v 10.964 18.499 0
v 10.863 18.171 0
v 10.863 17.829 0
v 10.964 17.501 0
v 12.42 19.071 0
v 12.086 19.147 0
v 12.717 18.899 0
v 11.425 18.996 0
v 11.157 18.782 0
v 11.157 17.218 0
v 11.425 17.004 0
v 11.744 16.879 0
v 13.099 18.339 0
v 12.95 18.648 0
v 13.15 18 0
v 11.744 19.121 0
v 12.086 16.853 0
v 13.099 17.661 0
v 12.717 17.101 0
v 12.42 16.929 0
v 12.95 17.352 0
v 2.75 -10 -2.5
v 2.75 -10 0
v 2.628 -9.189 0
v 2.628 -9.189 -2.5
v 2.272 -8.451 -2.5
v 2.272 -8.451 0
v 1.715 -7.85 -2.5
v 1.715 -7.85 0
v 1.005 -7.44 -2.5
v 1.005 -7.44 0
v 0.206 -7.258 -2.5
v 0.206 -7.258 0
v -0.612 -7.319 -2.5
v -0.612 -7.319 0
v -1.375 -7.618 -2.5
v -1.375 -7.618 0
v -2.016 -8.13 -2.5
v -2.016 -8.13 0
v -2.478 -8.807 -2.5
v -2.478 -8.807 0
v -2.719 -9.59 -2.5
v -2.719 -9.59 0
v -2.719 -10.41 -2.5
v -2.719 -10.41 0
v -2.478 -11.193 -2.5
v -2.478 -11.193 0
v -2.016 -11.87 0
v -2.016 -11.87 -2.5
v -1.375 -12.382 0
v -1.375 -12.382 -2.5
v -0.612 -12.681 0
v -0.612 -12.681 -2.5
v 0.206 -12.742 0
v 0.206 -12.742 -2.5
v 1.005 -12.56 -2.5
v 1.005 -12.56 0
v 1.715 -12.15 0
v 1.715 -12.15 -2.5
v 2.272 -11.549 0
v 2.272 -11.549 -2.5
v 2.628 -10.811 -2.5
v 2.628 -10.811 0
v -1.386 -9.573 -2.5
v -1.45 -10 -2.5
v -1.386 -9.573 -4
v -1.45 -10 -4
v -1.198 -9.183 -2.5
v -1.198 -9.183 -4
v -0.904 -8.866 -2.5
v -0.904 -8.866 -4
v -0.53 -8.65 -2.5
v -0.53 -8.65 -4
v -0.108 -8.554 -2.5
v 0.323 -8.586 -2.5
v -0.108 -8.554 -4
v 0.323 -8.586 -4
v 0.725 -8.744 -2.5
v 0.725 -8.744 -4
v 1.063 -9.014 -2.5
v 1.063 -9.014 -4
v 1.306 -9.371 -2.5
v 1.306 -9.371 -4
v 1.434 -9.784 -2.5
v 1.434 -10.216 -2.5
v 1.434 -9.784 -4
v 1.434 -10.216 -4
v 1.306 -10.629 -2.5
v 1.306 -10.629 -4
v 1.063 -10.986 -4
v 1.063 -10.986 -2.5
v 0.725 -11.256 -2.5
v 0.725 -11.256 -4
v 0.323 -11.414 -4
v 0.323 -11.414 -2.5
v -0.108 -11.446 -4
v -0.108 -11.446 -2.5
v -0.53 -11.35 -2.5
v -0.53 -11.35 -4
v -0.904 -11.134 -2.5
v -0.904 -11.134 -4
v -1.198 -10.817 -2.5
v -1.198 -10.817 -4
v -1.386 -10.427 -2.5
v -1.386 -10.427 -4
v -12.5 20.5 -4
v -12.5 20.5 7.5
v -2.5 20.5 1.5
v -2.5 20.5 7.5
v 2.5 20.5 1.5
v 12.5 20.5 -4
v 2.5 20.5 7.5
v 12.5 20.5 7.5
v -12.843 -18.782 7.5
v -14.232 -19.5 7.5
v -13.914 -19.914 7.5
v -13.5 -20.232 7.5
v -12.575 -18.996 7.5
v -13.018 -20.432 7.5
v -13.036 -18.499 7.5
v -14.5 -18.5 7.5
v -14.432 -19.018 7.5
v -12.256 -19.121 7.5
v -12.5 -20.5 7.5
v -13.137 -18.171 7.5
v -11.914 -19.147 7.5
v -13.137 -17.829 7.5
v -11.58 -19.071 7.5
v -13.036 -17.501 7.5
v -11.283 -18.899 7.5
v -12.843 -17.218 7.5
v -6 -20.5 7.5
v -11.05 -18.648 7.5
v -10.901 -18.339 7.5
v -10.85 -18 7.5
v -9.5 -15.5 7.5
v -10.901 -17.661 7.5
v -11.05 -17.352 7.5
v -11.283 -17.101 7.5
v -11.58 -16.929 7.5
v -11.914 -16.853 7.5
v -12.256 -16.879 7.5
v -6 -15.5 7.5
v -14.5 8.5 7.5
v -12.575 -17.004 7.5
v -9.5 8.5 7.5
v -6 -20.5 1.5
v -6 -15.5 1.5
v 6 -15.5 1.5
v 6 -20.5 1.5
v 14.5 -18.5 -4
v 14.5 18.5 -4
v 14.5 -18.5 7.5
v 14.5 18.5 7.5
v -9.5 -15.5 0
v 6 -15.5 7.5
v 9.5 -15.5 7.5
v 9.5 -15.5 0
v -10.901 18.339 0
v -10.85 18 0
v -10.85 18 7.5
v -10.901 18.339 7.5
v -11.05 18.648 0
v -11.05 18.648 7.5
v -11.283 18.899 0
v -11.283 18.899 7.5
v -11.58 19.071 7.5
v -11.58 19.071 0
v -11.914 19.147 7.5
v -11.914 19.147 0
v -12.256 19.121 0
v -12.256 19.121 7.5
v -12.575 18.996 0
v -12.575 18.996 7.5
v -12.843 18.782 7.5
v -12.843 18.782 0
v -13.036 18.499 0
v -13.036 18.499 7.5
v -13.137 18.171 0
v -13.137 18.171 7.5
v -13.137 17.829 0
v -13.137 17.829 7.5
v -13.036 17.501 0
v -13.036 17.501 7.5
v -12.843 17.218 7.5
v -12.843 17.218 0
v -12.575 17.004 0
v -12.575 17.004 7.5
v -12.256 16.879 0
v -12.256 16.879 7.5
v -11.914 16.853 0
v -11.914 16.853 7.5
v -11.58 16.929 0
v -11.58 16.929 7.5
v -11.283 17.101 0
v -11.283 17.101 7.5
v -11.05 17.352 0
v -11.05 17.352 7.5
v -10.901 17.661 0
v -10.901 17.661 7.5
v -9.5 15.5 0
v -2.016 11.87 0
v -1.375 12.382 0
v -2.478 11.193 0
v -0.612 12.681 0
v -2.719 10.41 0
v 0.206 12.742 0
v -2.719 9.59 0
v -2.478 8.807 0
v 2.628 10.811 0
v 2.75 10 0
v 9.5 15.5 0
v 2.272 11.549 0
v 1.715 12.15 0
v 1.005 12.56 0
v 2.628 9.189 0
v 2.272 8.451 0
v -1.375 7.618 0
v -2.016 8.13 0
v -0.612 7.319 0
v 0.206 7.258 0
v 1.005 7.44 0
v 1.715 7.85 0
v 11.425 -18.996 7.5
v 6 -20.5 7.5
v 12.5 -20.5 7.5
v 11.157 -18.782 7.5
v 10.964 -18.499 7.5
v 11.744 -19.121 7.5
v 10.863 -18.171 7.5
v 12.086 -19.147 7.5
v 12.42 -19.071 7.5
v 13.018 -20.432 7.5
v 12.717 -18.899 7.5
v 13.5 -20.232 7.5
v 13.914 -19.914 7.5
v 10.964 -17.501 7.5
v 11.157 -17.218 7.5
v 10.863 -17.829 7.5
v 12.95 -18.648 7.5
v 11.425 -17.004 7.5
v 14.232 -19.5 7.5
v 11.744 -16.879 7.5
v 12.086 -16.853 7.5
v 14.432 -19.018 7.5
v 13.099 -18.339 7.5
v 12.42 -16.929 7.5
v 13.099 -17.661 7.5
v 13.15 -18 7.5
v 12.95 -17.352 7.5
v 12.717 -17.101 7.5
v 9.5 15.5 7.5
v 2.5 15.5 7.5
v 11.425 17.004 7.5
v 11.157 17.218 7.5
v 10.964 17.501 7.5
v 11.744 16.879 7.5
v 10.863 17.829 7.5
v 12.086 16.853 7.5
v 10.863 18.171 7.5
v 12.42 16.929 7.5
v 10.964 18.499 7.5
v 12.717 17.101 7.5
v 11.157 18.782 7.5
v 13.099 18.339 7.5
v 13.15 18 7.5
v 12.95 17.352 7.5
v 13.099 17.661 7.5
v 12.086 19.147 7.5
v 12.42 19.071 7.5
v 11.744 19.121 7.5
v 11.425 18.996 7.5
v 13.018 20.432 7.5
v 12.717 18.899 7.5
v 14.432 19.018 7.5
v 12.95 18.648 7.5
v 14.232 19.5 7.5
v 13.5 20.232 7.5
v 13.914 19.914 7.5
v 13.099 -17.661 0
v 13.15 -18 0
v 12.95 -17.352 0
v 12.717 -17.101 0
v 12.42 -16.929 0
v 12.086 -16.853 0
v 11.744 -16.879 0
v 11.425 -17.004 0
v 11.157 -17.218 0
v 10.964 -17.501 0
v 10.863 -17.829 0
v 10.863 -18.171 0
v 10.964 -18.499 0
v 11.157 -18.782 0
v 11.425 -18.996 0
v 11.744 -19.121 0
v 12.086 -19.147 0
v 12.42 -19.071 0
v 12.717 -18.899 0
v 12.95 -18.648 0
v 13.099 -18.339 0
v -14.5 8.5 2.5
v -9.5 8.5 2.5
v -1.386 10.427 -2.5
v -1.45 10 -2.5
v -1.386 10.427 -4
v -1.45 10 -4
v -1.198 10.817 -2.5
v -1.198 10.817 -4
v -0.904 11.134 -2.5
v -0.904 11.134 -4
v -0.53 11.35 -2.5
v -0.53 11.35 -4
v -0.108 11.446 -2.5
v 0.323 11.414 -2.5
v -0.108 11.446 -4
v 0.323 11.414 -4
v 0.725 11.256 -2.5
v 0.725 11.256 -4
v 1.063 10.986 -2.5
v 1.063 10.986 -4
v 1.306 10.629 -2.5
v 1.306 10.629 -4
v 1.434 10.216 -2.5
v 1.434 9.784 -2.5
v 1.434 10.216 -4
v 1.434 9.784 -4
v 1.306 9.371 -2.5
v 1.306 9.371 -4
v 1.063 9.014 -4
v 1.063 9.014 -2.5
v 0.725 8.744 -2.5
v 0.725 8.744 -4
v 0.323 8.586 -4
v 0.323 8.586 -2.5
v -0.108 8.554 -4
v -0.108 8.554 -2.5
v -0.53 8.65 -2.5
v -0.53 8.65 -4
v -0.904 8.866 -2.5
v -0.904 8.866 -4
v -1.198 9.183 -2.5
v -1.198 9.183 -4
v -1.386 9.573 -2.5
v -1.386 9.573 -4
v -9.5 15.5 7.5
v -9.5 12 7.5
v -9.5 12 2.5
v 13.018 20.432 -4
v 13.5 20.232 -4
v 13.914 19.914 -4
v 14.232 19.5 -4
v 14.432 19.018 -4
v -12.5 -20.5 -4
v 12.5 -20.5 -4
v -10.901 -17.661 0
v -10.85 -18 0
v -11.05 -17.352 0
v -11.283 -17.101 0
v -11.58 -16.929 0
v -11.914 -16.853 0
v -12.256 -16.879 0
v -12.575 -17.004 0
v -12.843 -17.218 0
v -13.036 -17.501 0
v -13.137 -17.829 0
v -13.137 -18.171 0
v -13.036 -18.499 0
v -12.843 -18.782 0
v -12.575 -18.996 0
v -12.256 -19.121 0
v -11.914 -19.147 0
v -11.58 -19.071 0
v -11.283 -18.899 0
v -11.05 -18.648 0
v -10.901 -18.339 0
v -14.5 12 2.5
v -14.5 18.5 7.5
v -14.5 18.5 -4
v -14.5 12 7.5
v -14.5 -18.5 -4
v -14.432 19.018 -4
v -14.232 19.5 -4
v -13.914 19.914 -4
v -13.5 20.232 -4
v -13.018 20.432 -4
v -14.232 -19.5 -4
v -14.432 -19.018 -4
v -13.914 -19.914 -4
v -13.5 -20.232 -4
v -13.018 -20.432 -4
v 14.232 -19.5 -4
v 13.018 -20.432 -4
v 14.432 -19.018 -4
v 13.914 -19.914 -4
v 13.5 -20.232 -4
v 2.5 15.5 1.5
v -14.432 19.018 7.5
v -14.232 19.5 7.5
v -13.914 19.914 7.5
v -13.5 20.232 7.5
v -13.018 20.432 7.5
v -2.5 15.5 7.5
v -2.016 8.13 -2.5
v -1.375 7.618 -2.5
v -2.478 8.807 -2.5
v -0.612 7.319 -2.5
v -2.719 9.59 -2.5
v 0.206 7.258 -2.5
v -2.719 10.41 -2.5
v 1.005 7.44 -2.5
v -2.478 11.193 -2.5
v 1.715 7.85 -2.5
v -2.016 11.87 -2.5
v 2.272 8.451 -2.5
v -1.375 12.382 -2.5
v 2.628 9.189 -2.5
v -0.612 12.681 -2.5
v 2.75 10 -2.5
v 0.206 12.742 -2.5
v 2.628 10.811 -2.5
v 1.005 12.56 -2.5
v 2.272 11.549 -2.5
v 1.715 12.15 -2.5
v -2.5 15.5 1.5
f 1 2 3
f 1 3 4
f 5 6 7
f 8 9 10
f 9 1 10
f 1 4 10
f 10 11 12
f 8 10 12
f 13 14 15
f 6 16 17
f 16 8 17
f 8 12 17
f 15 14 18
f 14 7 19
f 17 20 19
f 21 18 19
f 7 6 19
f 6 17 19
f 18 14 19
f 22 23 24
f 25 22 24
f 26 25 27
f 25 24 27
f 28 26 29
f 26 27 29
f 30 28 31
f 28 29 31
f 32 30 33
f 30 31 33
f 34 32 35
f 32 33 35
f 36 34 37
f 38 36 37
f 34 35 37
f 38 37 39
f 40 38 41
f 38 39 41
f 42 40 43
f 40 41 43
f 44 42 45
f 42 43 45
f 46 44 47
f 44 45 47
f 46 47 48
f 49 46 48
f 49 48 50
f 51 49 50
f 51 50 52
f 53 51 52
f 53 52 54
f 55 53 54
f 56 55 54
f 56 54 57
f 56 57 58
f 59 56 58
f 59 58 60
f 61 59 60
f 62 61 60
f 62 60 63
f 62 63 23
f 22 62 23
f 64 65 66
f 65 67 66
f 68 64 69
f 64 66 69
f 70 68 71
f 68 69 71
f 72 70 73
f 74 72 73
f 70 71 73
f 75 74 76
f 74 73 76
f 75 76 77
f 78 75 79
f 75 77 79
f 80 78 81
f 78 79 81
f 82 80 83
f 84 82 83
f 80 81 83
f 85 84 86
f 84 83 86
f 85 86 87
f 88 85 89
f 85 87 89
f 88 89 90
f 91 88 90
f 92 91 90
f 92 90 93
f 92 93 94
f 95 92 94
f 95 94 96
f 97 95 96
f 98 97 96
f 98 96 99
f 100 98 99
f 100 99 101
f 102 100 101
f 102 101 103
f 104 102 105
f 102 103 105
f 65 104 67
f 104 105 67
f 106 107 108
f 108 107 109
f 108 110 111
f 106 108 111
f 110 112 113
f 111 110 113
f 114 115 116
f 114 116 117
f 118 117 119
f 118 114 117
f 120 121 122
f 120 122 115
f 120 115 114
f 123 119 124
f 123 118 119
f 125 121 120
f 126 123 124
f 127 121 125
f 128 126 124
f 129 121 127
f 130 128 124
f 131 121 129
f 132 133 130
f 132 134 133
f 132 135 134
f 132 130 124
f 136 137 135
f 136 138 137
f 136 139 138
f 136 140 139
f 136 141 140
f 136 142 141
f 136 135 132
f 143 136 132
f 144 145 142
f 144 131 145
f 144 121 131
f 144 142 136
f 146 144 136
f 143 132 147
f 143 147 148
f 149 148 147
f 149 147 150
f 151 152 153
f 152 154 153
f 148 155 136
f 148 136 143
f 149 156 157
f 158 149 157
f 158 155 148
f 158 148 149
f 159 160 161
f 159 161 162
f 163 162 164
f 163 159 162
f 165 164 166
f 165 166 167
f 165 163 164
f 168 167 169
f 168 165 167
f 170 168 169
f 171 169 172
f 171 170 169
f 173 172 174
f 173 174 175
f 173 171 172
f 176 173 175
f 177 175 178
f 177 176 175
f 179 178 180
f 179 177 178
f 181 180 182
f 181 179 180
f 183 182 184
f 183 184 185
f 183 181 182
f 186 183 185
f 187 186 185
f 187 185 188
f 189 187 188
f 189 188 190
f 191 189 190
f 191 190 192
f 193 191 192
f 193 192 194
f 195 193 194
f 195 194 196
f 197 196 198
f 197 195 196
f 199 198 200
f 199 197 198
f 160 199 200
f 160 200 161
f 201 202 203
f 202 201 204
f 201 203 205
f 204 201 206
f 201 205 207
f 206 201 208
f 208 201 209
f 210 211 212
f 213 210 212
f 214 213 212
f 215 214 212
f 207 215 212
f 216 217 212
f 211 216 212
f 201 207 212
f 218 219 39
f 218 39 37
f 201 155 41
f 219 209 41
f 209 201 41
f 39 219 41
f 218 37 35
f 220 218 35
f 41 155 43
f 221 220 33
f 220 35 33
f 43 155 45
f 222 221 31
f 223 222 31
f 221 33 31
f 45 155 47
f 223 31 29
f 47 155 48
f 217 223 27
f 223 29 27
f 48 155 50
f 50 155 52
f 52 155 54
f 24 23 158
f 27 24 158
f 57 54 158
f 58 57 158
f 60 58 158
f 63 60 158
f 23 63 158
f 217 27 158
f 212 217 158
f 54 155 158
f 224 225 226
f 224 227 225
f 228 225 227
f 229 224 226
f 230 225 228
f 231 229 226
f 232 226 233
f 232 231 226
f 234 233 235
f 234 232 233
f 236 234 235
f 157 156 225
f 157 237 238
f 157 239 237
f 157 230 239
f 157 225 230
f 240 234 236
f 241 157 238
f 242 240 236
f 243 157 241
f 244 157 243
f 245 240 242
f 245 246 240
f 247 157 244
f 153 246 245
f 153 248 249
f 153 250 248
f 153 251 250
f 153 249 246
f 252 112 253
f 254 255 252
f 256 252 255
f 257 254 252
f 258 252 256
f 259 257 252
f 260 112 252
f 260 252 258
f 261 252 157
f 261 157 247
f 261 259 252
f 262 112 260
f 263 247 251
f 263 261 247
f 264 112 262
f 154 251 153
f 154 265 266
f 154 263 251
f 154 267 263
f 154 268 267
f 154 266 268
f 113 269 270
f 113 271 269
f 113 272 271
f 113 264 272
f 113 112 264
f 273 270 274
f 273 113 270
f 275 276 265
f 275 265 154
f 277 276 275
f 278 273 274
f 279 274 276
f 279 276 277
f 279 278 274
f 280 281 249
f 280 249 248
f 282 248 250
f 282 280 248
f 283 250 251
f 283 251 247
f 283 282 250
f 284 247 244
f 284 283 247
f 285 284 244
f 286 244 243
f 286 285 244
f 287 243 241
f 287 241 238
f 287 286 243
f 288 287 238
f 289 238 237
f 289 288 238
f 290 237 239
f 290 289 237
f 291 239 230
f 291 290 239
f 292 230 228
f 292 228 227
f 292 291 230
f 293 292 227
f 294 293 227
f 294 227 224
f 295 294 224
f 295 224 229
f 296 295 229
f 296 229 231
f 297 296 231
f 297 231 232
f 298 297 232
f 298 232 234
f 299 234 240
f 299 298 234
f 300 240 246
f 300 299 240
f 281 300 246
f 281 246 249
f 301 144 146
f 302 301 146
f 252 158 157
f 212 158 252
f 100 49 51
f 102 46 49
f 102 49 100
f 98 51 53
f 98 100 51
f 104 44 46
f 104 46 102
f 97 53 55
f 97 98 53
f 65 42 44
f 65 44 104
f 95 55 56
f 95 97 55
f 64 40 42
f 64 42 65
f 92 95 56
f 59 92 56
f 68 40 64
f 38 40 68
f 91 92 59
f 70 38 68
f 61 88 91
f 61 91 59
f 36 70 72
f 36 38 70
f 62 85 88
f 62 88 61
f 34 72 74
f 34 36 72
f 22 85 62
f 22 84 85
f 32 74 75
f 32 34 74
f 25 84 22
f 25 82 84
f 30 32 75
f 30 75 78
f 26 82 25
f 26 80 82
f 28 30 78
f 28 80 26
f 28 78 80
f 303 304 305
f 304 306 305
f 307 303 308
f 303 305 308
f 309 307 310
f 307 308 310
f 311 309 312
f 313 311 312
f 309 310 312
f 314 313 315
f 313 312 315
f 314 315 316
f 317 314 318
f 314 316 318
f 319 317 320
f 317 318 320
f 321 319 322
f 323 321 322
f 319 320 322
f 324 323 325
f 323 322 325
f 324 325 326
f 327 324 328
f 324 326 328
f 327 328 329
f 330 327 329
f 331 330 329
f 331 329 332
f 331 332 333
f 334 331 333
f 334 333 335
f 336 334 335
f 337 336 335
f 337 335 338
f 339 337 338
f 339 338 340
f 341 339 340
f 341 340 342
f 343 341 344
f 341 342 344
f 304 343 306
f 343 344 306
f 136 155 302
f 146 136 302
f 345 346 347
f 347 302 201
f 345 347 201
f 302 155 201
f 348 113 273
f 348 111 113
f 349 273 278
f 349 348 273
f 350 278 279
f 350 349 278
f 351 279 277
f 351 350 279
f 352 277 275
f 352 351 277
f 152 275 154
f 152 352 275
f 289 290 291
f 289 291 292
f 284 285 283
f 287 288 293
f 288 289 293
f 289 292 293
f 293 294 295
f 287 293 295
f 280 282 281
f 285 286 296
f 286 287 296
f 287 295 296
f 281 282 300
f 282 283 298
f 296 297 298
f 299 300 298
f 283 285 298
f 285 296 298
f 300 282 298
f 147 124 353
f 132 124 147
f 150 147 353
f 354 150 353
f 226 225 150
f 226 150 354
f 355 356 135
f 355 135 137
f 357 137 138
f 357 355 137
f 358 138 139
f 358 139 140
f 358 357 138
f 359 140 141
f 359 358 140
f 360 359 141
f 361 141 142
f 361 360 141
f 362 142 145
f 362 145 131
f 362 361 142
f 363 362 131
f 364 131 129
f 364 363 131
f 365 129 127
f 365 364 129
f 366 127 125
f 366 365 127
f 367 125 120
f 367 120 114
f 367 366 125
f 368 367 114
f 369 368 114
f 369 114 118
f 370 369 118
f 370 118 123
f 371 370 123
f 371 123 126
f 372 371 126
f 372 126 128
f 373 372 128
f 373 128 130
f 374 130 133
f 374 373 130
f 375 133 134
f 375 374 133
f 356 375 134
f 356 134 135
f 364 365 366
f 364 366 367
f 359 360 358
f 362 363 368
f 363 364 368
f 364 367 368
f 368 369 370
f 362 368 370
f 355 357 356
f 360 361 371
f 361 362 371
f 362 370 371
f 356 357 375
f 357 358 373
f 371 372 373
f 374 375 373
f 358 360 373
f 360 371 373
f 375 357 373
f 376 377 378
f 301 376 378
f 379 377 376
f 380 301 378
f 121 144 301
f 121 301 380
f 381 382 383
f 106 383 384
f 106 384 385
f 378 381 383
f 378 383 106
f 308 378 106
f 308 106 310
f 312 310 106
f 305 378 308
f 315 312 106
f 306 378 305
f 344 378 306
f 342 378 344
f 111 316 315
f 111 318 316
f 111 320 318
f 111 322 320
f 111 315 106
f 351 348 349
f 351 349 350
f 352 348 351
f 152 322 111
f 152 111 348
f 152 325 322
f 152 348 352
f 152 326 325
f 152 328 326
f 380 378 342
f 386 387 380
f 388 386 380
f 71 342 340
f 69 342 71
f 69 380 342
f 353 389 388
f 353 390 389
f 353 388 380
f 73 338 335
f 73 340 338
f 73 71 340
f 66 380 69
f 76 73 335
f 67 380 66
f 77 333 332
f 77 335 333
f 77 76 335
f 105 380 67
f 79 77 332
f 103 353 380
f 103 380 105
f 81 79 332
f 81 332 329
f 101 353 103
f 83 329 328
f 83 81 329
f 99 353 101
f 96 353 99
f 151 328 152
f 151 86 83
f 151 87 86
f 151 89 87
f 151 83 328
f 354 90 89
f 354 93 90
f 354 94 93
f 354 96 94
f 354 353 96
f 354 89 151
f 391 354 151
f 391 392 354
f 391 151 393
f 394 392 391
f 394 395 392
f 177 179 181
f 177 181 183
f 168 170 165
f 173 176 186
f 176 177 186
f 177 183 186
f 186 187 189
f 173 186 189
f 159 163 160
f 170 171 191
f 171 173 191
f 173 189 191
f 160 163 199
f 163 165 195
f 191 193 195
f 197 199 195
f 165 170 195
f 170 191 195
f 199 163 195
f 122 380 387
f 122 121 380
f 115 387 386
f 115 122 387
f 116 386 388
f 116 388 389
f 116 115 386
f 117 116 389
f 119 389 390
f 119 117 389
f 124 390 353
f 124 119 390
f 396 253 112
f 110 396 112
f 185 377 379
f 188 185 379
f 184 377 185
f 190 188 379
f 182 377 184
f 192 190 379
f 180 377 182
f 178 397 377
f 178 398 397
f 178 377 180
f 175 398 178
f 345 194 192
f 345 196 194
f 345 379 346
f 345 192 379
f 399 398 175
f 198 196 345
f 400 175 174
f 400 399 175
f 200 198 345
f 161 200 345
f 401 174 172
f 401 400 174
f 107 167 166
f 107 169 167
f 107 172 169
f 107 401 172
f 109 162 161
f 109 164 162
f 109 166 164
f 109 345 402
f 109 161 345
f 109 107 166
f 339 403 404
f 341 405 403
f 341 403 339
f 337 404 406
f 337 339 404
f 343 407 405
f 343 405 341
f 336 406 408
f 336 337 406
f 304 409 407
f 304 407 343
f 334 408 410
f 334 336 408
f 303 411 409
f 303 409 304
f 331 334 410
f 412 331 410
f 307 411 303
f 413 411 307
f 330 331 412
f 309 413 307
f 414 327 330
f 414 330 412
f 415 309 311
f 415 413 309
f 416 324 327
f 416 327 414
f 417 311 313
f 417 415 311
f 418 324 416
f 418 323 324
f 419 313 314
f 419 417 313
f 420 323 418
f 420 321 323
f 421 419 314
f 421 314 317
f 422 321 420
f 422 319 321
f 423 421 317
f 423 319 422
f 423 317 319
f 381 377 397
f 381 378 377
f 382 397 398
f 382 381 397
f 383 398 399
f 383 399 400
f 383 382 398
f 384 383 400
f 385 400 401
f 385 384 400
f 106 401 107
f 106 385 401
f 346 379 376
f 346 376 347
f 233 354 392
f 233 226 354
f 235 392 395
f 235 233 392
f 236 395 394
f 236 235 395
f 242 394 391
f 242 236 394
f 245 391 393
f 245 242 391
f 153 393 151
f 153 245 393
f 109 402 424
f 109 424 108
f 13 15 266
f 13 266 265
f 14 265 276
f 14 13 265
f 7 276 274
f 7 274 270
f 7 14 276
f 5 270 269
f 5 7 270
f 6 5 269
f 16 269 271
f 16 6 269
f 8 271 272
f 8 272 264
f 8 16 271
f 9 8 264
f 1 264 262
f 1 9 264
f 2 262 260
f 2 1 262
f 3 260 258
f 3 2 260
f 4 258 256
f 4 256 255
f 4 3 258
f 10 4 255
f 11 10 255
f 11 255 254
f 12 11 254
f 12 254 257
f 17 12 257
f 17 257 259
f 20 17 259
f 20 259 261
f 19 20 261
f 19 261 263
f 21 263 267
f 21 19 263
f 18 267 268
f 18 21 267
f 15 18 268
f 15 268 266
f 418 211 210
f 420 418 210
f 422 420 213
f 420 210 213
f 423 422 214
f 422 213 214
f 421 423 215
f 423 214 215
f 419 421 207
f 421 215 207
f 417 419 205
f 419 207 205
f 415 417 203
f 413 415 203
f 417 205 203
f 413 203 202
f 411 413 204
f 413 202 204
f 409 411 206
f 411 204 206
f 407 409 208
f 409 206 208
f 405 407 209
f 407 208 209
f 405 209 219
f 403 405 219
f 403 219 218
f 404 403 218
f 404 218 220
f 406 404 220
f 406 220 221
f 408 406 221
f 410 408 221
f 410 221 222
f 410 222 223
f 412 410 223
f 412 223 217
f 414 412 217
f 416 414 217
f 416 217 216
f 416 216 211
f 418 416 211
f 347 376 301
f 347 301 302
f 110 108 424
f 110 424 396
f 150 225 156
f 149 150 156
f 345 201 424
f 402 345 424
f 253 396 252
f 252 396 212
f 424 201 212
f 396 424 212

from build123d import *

# Parameters (mm, degrees)
F0_W           = 29
F0_H           = 41
F0_R           = 1.15
F0_W_2         = 19
F0_H_2         = 31
F1_DEPTH       = 7.5
F2_W           = 29
F2_H           = 41
F2_R           = 1.15
F2_W_2         = 19
F2_H_2         = 31
F3_DEPTH       = 4
F4_W           = 12
F4_H           = 5
F4_W_2         = 5
F5_DEPTH       = 6
F6_R           = 2
F8_D           = 2.9
F8_CBORE_D     = 5.5
F8_CBORE_DEPTH = 2.5
F9_W           = 5
F9_H           = 3.5
F10_DEPTH      = 5


with BuildPart() as f1:
    # F0 (on Top) → F1 (new body)
    with BuildSketch(Plane.XY):
        Rectangle(F0_W, F0_H)
        with Locations((-12, -18)):
            Circle(F0_R, mode=Mode.SUBTRACT)
        with Locations((12, -18)):
            Circle(F0_R, mode=Mode.SUBTRACT)
        with Locations((-12, 18)):
            Circle(F0_R, mode=Mode.SUBTRACT)
        Rectangle(F0_W_2, F0_H_2, mode=Mode.SUBTRACT)
        with Locations((12, 18)):
            Circle(F0_R, mode=Mode.SUBTRACT)
    extrude(amount=F1_DEPTH)

    # F2 (on face) → F3 (join)
    with BuildSketch(Plane(origin=(0, 0, 0), x_dir=(1, 0, 0), z_dir=(0, 0, -1))):
        Rectangle(F2_W, F2_H)
        with Locations((-12, -18)):
            Circle(F2_R, mode=Mode.SUBTRACT)
        with Locations((12, -18)):
            Circle(F2_R, mode=Mode.SUBTRACT)
        with Locations((-12, 18)):
            Circle(F2_R, mode=Mode.SUBTRACT)
        Rectangle(F2_W_2, F2_H_2, mode=Mode.SUBTRACT)
        with Locations((12, 18)):
            Circle(F2_R, mode=Mode.SUBTRACT)
        with Locations((-12, 18)):
            Circle(F2_R)
        with Locations((12, 18)):
            Circle(F2_R)
        with Locations((-12, -18)):
            Circle(F2_R)
        Rectangle(F2_W_2, F2_H_2)
        with Locations((12, -18)):
            Circle(F2_R)
    extrude(amount=F3_DEPTH)

    # F4 (on face) → F5 (cut)
    with BuildSketch(Plane.XY.offset(7.5)):
        with Locations((0, -18)):
            Rectangle(F4_W, F4_H)
        with Locations((0, 18)):
            Rectangle(F4_W_2, F4_H)
    extrude(amount=-F5_DEPTH, mode=Mode.SUBTRACT)

    # F6
    f6_edges = [f1.edges().sort_by_distance(p)[0] for p in [
        (-14.5, 20.5, 1.75),
        (14.5, 20.5, 1.75),
        (14.5, -20.5, 1.75),
        (-14.5, -20.5, 1.75),
    ]]
    fillet(f6_edges, radius=F6_R)

    # F8 (through all)
    with Locations(Plane.XY):
        with Locations((0, 10), (0, -10)):
            CounterBoreHole(F8_D / 2, F8_CBORE_D / 2, F8_CBORE_DEPTH)

    # F9 (on face) → F10 (cut)
    with BuildSketch(Plane.XY.offset(7.5)):
        with Locations((-12, 10.25)):
            Rectangle(F9_W, F9_H)
    extrude(amount=-F10_DEPTH, mode=Mode.SUBTRACT)


solid = f1.part
